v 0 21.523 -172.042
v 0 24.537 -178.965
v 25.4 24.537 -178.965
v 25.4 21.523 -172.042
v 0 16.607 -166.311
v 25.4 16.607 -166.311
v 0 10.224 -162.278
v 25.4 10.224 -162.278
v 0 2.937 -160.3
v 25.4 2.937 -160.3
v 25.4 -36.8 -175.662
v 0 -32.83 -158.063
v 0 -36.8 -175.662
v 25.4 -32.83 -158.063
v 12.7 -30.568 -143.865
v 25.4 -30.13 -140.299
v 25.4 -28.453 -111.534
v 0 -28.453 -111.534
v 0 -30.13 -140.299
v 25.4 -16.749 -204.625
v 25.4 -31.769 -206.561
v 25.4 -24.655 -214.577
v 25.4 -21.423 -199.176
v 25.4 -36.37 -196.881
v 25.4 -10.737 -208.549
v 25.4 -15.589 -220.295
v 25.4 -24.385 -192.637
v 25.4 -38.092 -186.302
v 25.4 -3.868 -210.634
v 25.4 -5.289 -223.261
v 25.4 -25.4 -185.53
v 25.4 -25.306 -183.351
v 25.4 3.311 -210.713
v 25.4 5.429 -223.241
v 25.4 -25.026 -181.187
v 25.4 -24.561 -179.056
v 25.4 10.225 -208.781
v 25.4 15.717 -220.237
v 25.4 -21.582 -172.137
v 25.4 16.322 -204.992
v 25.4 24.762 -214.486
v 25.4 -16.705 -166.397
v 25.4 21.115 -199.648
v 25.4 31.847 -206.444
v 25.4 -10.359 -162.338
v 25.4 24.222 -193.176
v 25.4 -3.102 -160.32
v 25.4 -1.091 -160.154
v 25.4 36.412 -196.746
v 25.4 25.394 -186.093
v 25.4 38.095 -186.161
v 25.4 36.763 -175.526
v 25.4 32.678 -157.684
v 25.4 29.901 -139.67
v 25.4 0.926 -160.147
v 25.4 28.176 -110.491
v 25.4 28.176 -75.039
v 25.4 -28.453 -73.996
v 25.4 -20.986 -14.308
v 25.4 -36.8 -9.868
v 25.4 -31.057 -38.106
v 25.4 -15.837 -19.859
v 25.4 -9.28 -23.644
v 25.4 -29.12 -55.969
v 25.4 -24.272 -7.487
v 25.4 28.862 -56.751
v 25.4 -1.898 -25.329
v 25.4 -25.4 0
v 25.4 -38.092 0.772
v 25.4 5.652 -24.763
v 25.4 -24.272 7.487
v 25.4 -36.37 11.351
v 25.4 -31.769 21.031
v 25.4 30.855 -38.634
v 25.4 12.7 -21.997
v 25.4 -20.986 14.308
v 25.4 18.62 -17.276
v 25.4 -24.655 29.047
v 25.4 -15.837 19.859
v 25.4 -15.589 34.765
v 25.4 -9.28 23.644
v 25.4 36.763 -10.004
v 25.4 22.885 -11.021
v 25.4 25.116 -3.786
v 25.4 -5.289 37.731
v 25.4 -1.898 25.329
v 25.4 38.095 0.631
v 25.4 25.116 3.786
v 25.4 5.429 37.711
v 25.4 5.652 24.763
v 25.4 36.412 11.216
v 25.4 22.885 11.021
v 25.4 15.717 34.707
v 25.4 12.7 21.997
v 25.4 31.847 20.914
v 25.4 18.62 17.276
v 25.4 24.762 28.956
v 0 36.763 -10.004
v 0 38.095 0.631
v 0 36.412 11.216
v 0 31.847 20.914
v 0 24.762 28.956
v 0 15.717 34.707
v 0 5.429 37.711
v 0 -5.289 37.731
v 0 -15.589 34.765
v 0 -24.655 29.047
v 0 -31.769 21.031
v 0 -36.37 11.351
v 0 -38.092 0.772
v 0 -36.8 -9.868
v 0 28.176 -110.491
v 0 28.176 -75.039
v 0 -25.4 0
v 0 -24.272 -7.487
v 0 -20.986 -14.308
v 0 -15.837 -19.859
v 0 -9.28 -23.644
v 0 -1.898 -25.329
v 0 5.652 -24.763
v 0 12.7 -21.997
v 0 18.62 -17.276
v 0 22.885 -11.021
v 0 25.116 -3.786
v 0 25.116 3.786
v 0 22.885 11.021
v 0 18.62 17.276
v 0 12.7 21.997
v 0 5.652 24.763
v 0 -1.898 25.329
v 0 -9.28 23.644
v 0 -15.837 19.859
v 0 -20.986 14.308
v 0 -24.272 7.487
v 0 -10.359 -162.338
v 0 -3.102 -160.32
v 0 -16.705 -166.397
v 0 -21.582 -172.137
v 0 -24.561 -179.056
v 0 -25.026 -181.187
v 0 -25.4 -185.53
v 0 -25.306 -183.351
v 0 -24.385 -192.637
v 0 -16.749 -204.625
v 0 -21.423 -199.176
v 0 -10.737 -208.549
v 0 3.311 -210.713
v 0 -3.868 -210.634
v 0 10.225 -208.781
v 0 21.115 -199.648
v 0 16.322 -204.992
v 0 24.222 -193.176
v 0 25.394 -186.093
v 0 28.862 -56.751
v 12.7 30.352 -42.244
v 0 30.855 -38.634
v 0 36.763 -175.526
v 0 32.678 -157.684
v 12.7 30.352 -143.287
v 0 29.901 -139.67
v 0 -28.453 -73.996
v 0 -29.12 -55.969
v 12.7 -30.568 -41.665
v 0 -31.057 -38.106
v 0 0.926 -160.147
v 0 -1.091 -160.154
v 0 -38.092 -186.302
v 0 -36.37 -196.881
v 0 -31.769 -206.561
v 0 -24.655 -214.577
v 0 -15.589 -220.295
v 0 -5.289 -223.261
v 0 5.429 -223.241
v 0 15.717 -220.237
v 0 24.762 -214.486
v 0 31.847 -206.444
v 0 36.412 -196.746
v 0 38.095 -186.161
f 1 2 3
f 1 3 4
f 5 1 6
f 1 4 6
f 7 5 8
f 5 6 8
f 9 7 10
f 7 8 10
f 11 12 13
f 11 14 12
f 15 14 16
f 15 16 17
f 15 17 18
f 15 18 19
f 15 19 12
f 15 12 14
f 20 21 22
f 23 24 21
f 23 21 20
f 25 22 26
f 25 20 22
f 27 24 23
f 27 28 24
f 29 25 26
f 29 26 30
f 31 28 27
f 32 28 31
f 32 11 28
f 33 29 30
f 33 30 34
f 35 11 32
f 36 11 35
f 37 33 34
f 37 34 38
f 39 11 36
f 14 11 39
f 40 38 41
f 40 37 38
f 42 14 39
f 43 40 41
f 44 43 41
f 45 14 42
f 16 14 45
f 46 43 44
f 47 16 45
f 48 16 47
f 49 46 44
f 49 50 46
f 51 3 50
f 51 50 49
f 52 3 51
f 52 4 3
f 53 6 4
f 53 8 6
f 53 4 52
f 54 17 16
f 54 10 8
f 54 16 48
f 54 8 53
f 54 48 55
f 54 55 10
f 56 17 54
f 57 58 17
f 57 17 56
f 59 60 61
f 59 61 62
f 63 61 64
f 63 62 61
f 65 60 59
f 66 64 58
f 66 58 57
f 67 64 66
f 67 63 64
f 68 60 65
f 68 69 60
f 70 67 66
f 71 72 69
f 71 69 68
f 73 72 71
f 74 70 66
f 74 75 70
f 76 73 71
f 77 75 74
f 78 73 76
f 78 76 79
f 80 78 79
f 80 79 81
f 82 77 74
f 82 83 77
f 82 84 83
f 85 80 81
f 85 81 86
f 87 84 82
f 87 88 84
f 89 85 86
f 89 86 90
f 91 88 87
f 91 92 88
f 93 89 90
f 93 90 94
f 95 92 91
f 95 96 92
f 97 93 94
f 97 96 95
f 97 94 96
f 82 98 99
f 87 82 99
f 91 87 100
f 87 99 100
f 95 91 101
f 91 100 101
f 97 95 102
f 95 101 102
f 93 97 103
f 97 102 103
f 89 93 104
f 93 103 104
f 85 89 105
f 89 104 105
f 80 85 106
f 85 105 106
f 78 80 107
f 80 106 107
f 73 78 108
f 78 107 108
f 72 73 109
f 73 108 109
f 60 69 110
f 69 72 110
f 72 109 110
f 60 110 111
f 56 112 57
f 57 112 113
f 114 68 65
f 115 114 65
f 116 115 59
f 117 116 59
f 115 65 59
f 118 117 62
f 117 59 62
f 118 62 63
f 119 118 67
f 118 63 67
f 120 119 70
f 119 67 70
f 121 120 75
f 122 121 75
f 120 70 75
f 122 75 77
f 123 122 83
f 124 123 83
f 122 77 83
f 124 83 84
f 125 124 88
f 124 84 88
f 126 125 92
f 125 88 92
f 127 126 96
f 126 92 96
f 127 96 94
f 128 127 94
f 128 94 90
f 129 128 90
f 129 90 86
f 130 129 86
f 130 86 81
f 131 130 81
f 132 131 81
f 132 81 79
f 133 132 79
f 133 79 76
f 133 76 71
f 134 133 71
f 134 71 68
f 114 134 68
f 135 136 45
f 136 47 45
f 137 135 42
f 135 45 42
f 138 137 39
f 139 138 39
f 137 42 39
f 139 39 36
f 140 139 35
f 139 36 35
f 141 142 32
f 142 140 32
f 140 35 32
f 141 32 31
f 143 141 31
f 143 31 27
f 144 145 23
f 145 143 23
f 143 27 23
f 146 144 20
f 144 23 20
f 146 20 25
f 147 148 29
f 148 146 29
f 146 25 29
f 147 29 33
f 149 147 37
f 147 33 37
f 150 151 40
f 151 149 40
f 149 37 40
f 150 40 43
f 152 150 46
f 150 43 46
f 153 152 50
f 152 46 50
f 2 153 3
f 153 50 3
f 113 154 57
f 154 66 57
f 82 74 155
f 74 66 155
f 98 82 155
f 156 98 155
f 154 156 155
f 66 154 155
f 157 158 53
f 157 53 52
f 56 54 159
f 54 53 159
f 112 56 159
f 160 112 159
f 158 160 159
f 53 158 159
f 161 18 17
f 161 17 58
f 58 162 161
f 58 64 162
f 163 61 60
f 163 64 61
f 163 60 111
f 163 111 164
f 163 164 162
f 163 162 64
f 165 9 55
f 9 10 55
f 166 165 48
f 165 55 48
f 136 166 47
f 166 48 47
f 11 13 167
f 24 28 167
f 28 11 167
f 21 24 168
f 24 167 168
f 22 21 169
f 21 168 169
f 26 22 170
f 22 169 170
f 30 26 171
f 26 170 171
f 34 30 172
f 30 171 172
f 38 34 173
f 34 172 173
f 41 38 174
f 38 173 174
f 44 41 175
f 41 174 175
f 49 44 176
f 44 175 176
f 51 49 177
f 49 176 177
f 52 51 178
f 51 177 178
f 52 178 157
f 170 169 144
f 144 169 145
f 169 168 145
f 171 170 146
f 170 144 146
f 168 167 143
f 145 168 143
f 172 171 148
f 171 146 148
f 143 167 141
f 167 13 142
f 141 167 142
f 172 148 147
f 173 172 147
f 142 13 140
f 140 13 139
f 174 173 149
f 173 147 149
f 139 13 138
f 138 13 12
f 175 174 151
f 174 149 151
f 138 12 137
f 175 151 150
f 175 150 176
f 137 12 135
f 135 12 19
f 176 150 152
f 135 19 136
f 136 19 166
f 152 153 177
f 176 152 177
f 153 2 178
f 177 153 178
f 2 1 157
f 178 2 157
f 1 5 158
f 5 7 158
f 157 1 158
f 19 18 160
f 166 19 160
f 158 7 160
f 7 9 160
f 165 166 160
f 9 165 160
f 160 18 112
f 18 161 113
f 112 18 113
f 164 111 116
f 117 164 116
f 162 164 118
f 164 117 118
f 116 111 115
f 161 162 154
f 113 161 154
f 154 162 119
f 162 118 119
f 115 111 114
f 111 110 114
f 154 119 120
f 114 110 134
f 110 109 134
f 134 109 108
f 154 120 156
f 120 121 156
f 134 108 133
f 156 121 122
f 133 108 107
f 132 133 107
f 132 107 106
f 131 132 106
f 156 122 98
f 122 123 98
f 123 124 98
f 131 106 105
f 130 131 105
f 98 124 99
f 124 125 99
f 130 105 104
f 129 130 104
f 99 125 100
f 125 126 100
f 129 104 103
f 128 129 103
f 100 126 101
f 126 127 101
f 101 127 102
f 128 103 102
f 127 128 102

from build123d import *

# Parameters (mm, degrees)
F2_W          = 56.6284824163
F2_H          = 136.3001726568
F3_DEPTH      = 25.4
F0_R          = 38.1
F4_DEPTH      = 25.4
F1_R          = 38.1
F5_DEPTH      = 25.4
F6_D          = 50.8
F8_D          = 50.8
F11_T4_DEPTH  = 25.4
F11_S5_R      = 25.4
F11_T6_DEPTH  = 43
F11_T10_DEPTH = 25.4
F11_S11_R     = 25.4
F11_T12_DEPTH = 43
F11_T16_DEPTH = 25.4
F11_S17_R     = 25.4
F11_T18_DEPTH = 43
F11_T22_DEPTH = 25.4
F11_S23_R     = 25.4
F11_T24_DEPTH = 43


# Not quite as in the source:
# - a fillet or chamfer that OpenCascade refuses, or shapes differently, is made with other operations: its cross-section is extruded or revolved along the edge and cut away or added
# - two fillets or chamfers of one size are made in one step


with BuildPart() as f3:
    # F2 (on Right) → F3 (new body)
    with BuildSketch(Plane.YZ):
        with Locations((-0.1386040822, -92.7020926028)):
            Rectangle(F2_W, F2_H)
    extrude(amount=F3_DEPTH)

    # F0 (on Right) → F4 (join)
    with BuildSketch(Plane.YZ):
        Circle(F0_R)
    extrude(amount=F4_DEPTH)

    # F1 (on Right) → F5 (join)
    with BuildSketch(Plane.YZ):
        with Locations((0, -185.5300813913)):
            Circle(F1_R)
    extrude(amount=F5_DEPTH)

    # F6 (through all)
    with Locations(Plane(origin=(0, 0, 0), x_dir=(0, 1, 0), z_dir=(-1, 0, 0))):
        with Locations((0, 0)):
            Hole(F6_D / 2)

    # F8 (through all)
    with Locations(Plane.YZ.offset(25.4)):
        with Locations((0, -185.5300813913)):
            Hole(F8_D / 2)

    # F11: fillet of radius 254 on 4 edges, made by hand


with BuildPart() as f11_tool2:
    # F11_s3 → F11_t4 (new body)
    with BuildSketch(Plane.YZ.offset(25.4)):
        with BuildLine():
            add(Edge.make_bspline(
                [(-28.4524452903, -111.0798377649), (-28.4524452903, -143.9931007722), (-36.841297299, -175.8193484896)],
                knots=[0, 0, 0, 1, 1, 1], degree=2, weights=[1, 1, 1]))
            Line((-36.841297299, -175.8193484896), (-12.2799424998, -182.293299562))
            ThreePointArc((-12.2799424998, -182.293299562), (-11.1895620368, -179.5236177494), (-9.4841025329, -177.0840347894))
            Line((-9.4841025329, -177.0840347894), (-3.0526052903, -160.1914627454))
            ThreePointArc((-3.0526052903, -160.1914627454), (-3.0526052903, -135.6356502551), (-3.0522052903, -111.0798377649))
            Line((-3.0522052903, -111.0798377649), (-28.4524452903, -111.0798377649))
        make_face()
    extrude(amount=-F11_T4_DEPTH)

    # F11_s5 → F11_t6 (cut, symmetric)
    with BuildSketch(Plane.YZ.offset(12.7)):
        with Locations((0, -185.5300813913)):
            Circle(F11_S5_R)
    extrude(amount=F11_T6_DEPTH, both=True, mode=Mode.SUBTRACT)


with BuildPart() as f3_1:
    add(f3.part)

    # F11_t1: union F11_tool2
    add(f11_tool2.part)


with BuildPart() as f11_tool8:
    # F11_s9 → F11_t10 (new body)
    with BuildSketch(Plane.YZ.offset(25.4)):
        with BuildLine():
            add(Edge.make_bspline(
                [(-36.841297299, -9.7107329018), (-28.4524452903, -41.5369806191), (-28.4524452903, -74.4502436264)],
                knots=[0, 0, 0, 1, 1, 1], degree=2, weights=[1, 1, 1]))
            Line((-28.4524452903, -74.4502436264), (-3.0522052903, -74.4502436264))
            ThreePointArc((-3.0522052903, -74.4502436264), (-3.0526052903, -49.8944311362), (-3.0526052903, -25.338618646))
            Line((-3.0526052903, -25.338618646), (-9.4841025329, -8.446046602))
            ThreePointArc((-9.4841025329, -8.446046602), (-11.1895620368, -6.0064636419), (-12.2799424998, -3.2367818293))
            Line((-12.2799424998, -3.2367818293), (-36.841297299, -9.7107329018))
        make_face()
    extrude(amount=-F11_T10_DEPTH)

    # F11_s11 → F11_t12 (cut, symmetric)
    with BuildSketch(Plane.YZ.offset(12.7)):
        Circle(F11_S11_R)
    extrude(amount=F11_T12_DEPTH, both=True, mode=Mode.SUBTRACT)


with BuildPart() as f3_2:
    add(f3_1.part)

    # F11_t7: union F11_tool8
    add(f11_tool8.part)


with BuildPart() as f11_tool14:
    # F11_s15 → F11_t16 (new body)
    with BuildSketch(Plane.YZ.offset(25.4)):
        with BuildLine():
            add(Edge.make_bspline(
                [(36.8051403395, -9.8468860434), (28.175237126, -42.1032559751), (28.175237126, -75.4941024849)],
                knots=[0, 0, 0, 1, 1, 1], degree=2, weights=[1, 1, 1]))
            Line((28.175237126, -75.4941024849), (2.774997126, -75.4941024849))
            ThreePointArc((2.774997126, -75.4941024849), (2.775397126, -50.5703062168), (2.775397126, -25.6465099486))
            Line((2.775397126, -25.6465099486), (9.3917015577, -8.5486750967))
            ThreePointArc((9.3917015577, -8.5486750967), (11.1455038849, -6.0878277907), (12.2678906608, -3.2821643992))
            Line((12.2678906608, -3.2821643992), (36.8051403395, -9.8468860434))
        make_face()
    extrude(amount=-F11_T16_DEPTH)

    # F11_s17 → F11_t18 (cut, symmetric)
    with BuildSketch(Plane.YZ.offset(12.7)):
        Circle(F11_S17_R)
    extrude(amount=F11_T18_DEPTH, both=True, mode=Mode.SUBTRACT)


with BuildPart() as f3_3:
    add(f3_2.part)

    # F11_t13: union F11_tool14
    add(f11_tool14.part)


with BuildPart() as f11_tool20:
    # F11_s21 → F11_t22 (new body)
    with BuildSketch(Plane.YZ.offset(25.4)):
        with BuildLine():
            add(Edge.make_bspline(
                [(28.175237126, -110.0359789064), (28.175237126, -143.4268254163), (36.8051403395, -175.683195348)],
                knots=[0, 0, 0, 1, 1, 1], degree=2, weights=[1, 1, 1]))
            Line((36.8051403395, -175.683195348), (12.2678906608, -182.2479169921))
            ThreePointArc((12.2678906608, -182.2479169921), (11.1455038849, -179.4422536006), (9.3917015577, -176.9814062946))
            Line((9.3917015577, -176.9814062946), (2.775397126, -159.8835714427))
            ThreePointArc((2.775397126, -159.8835714427), (2.775397126, -134.9597751745), (2.774997126, -110.0359789064))
            Line((2.774997126, -110.0359789064), (28.175237126, -110.0359789064))
        make_face()
    extrude(amount=-F11_T22_DEPTH)

    # F11_s23 → F11_t24 (cut, symmetric)
    with BuildSketch(Plane.YZ.offset(12.7)):
        with Locations((0, -185.5300813913)):
            Circle(F11_S23_R)
    extrude(amount=F11_T24_DEPTH, both=True, mode=Mode.SUBTRACT)


with BuildPart() as f3_4:
    add(f3_3.part)

    # F11_t19: union F11_tool20
    add(f11_tool20.part)


solid = f3_4.part
